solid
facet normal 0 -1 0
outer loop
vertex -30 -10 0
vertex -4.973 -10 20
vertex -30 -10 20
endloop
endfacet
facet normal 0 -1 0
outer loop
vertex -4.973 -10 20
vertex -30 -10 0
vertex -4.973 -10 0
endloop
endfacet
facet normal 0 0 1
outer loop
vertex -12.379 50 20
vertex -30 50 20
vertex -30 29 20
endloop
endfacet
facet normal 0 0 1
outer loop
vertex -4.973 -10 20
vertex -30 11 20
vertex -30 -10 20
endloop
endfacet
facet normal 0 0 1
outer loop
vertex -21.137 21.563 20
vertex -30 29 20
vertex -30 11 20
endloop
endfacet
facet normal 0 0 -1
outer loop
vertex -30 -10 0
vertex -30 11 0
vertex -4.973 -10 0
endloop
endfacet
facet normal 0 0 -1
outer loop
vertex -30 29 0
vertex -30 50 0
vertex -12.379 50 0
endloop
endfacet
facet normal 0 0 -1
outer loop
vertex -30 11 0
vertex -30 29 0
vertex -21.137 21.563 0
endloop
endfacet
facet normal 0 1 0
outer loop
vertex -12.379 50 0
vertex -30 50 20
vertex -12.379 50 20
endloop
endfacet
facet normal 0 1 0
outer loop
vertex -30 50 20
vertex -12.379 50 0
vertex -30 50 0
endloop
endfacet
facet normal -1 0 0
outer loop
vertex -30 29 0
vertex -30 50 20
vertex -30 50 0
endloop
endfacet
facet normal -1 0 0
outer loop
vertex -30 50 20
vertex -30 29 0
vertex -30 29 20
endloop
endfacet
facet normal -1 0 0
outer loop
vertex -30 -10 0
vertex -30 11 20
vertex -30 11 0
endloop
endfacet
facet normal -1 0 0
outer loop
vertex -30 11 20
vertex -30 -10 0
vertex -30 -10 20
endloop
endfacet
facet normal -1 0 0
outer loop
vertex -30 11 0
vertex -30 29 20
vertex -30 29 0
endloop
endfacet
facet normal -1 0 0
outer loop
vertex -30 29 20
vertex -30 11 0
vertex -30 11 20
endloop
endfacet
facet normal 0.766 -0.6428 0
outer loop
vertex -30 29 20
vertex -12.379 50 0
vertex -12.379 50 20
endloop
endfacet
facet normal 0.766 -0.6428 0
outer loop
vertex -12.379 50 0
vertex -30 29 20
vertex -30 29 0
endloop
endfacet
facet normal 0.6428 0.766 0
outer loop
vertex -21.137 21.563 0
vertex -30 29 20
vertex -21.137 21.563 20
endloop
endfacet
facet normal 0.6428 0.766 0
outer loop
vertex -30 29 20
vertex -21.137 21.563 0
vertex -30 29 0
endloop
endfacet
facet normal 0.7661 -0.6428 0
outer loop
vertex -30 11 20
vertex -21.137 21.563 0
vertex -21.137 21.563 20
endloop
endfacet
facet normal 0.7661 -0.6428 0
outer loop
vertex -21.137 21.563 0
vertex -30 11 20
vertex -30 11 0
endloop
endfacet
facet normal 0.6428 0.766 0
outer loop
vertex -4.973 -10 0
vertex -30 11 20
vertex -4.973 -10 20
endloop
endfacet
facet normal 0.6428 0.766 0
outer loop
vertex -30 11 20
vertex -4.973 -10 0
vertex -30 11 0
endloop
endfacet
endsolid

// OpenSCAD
translate([-30,50,0])
scale([3,3,1])
rotate([0,0,-90]) {
    difference() {
        cube([20, 20, 20]);
        translate([7, 0, -1]) {
            rotate([0,0,50]) {
                cube([30, 30, 30]);
            }
        }
        translate([13, 0, -1]) {
            rotate([0,0,50]) {
                cube([30, 30, 30]);
            }
        }
    }
}
